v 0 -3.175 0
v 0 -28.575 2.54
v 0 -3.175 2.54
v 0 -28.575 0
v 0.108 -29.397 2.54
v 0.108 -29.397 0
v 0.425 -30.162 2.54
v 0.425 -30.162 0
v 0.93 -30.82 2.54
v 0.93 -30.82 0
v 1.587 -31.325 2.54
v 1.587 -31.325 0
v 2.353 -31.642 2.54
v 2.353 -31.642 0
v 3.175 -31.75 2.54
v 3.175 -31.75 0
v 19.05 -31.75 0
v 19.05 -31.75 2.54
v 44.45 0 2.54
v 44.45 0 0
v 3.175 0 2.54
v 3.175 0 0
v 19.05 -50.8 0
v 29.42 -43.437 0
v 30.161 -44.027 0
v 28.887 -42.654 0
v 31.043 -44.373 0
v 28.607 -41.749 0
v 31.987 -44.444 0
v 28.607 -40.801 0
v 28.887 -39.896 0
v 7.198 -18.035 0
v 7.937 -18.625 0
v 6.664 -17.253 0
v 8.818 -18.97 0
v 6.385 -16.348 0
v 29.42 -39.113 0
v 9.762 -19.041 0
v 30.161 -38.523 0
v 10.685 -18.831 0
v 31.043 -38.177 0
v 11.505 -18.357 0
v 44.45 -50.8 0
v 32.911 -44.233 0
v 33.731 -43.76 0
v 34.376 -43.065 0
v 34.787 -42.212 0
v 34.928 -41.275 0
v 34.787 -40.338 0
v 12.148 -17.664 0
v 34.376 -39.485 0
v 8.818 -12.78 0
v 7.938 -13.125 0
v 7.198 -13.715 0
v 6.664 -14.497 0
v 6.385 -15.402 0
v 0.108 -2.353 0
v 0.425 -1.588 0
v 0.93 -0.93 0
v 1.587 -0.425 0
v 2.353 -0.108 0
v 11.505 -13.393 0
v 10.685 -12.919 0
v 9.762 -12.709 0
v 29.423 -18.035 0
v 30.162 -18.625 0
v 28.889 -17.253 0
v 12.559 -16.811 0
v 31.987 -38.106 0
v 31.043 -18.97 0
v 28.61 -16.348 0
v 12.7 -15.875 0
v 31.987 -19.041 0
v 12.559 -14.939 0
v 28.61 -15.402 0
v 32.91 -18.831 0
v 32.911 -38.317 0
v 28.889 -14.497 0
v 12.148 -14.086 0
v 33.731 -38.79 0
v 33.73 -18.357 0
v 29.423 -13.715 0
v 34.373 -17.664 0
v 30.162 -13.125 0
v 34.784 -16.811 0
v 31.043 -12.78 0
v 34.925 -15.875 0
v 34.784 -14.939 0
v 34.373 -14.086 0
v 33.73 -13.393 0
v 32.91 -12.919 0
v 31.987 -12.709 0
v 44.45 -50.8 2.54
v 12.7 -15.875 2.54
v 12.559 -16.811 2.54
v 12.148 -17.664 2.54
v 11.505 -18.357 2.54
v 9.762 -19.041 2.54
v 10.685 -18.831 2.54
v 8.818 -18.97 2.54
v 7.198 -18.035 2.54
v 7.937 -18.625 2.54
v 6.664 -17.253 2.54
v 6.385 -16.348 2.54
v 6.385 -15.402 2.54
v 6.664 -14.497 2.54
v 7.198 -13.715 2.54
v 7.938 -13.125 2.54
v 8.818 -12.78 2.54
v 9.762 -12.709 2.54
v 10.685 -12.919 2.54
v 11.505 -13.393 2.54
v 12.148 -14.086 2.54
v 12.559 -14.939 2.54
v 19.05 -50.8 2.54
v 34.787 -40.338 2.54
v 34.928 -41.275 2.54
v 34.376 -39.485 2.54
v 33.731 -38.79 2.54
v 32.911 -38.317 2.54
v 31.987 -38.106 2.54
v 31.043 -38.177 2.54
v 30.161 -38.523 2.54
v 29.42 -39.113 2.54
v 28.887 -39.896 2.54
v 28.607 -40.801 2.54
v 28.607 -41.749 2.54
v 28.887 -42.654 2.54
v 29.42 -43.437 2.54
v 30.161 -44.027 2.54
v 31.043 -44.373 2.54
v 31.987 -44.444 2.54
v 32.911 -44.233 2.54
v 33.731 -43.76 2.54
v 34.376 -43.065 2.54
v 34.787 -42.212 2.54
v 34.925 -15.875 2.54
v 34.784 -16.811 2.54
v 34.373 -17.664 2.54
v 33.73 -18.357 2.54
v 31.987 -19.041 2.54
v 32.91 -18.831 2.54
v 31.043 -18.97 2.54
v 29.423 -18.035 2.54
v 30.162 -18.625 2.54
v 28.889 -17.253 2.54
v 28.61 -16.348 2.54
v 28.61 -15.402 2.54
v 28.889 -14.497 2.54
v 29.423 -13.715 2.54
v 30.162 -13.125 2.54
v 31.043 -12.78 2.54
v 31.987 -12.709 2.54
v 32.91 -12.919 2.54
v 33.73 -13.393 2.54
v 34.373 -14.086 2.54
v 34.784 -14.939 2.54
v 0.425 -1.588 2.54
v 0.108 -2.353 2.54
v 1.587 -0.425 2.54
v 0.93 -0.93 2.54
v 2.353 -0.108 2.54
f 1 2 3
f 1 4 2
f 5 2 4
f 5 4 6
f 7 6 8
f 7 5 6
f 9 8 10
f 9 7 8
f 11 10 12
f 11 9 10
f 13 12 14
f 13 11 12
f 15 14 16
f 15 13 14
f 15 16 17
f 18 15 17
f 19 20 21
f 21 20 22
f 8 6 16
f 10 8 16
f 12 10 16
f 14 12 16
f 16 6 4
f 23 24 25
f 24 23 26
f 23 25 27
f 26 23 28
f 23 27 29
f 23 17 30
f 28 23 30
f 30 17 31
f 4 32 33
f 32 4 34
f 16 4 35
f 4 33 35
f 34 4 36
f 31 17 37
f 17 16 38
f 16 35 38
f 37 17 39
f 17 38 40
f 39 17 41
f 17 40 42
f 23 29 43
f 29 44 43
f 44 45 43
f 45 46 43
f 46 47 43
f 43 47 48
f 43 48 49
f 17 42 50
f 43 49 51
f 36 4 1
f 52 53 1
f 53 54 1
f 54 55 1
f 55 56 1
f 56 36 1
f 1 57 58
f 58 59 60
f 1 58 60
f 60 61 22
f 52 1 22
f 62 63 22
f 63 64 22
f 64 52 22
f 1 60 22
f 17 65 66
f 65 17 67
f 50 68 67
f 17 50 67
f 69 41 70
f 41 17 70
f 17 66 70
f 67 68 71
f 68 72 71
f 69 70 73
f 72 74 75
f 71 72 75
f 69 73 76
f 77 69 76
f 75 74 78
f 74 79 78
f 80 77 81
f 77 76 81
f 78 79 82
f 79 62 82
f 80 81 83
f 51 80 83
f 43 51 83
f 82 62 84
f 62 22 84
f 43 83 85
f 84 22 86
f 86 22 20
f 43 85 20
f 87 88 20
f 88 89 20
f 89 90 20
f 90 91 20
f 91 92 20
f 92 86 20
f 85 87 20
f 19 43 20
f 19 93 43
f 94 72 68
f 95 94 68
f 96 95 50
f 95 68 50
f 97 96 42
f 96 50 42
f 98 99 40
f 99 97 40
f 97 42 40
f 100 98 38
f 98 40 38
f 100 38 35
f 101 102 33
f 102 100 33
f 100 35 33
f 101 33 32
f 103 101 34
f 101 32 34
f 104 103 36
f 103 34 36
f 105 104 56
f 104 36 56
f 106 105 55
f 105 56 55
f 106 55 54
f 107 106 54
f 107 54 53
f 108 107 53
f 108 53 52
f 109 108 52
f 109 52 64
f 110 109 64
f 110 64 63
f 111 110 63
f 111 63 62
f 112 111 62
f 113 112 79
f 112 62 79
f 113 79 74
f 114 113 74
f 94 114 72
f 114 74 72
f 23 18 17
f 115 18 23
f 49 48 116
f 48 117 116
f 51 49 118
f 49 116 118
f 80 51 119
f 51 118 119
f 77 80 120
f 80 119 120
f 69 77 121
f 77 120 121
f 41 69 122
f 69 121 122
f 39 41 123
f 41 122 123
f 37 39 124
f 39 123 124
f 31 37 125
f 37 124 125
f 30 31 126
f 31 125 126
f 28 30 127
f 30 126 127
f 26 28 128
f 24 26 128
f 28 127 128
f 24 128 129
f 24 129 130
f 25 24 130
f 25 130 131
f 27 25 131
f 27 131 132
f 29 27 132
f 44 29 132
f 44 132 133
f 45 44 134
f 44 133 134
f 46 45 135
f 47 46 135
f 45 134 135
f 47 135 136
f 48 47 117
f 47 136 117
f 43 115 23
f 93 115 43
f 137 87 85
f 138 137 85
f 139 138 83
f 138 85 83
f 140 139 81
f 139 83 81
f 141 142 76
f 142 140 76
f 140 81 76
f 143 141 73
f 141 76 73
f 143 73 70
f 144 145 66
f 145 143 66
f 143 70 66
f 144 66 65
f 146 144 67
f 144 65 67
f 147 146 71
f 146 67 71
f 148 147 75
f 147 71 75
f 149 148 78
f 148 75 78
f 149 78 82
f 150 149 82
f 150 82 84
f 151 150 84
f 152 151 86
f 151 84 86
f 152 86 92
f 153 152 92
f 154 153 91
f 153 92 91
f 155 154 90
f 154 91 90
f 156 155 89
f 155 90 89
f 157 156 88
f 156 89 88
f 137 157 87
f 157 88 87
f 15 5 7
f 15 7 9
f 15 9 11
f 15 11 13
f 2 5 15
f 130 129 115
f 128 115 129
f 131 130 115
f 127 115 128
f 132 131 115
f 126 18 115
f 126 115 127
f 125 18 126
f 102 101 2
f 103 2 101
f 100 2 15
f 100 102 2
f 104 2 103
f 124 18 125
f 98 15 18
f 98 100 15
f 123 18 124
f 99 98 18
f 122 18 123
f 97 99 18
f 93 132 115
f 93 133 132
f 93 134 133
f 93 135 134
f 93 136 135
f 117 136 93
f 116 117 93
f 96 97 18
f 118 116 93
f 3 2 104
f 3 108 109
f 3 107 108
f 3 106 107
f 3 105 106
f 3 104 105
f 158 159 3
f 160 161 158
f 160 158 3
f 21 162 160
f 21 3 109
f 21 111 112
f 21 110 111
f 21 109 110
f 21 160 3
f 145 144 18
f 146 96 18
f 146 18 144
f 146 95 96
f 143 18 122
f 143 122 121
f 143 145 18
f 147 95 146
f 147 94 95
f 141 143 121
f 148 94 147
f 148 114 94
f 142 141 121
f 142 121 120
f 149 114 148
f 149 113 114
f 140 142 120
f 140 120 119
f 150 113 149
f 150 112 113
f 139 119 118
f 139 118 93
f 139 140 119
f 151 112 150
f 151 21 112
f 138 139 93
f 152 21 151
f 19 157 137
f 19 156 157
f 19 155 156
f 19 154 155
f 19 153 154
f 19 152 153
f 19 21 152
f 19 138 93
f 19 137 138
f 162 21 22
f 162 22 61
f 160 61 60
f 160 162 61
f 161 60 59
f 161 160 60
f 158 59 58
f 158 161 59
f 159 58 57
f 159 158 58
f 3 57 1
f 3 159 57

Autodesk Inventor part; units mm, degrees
ref_plane "YZ Plane" through (0, 0, 0) normal (1, 0, 0) x (0, 1, 0)
ref_plane "XZ Plane" through (0, 0, 0) normal (0, 1, 0) x (-1, 0, 0)
ref_plane "XY Plane" through (0, 0, 0) normal (0, 0, 1) x (1, 0, 0)
sketch "Sketch1" plane through (0, 0, 0) normal (0, 0, 1) x (1, 0, 0)
  line L0 (0, 0) -> (19.05, 0)
  line L1 (19.05, 0) -> (19.05, -31.75)
  line L2 (19.05, -31.75) -> (0, -31.75)
  line L3 (0, -31.75) -> (0, 0)
  circle A0 centre (9.525, -15.875) radius 3.175
  line L4 (19.05, -31.75) -> (44.45, -31.75)
  line L5 (44.45, -31.75) -> (44.45, 0)
  line L6 (44.45, 0) -> (19.05, 0)
  line L7 (19.05, 0) -> (19.05, -31.75)
  circle A1 centre (31.75, -15.875) radius 3.175
  dimension "d0" = 19.05
  dimension "d1" = 31.75
  dimension "d2" = 6.35
  dimension "d5" = 25.4
extrude "Extrusion1" add sketch "Sketch1" along normal blind 2.54 contours L0 L1 L2 L3
extrude "Extrusion2" cut sketch "Sketch1" along normal blind 2.54 contours L6 L5 L4 L1
extrude "Extrusion3" add sketch "Sketch1" along normal blind 2.54 contours L6 L5 L4 L1
fillet "Fillet1" radius 3.175 1 edges at (0, 0, 1.27)
fillet "Fillet2" radius 3.175 1 edges at (0, -31.75, 1.27)
sketch "Sketch3" plane through (0, 0, 2.54) normal (0, 0, 1) x (1, 0, 0)
  circle A0 centre (31.75, -15.875) radius 3.175 projected
  circle A1 centre (31.75, -41.275) radius 3.178
  line L0 (44.45, -31.75) -> (19.05, -31.75)
  line L1 (19.05, -31.75) -> (19.05, -50.8)
  line L2 (19.05, -50.8) -> (44.45, -50.8)
  line L3 (44.45, -50.8) -> (44.45, -31.75)
  point P0 (0, 0)
  dimension "d12" = 25.4
  dimension "d13" = 19.05
extrude "Extrusion4" add sketch "Sketch3" against normal blind 2.54 contours L3 L2 L1 L0
properties part number "Pneumatic Spring attach Point"
